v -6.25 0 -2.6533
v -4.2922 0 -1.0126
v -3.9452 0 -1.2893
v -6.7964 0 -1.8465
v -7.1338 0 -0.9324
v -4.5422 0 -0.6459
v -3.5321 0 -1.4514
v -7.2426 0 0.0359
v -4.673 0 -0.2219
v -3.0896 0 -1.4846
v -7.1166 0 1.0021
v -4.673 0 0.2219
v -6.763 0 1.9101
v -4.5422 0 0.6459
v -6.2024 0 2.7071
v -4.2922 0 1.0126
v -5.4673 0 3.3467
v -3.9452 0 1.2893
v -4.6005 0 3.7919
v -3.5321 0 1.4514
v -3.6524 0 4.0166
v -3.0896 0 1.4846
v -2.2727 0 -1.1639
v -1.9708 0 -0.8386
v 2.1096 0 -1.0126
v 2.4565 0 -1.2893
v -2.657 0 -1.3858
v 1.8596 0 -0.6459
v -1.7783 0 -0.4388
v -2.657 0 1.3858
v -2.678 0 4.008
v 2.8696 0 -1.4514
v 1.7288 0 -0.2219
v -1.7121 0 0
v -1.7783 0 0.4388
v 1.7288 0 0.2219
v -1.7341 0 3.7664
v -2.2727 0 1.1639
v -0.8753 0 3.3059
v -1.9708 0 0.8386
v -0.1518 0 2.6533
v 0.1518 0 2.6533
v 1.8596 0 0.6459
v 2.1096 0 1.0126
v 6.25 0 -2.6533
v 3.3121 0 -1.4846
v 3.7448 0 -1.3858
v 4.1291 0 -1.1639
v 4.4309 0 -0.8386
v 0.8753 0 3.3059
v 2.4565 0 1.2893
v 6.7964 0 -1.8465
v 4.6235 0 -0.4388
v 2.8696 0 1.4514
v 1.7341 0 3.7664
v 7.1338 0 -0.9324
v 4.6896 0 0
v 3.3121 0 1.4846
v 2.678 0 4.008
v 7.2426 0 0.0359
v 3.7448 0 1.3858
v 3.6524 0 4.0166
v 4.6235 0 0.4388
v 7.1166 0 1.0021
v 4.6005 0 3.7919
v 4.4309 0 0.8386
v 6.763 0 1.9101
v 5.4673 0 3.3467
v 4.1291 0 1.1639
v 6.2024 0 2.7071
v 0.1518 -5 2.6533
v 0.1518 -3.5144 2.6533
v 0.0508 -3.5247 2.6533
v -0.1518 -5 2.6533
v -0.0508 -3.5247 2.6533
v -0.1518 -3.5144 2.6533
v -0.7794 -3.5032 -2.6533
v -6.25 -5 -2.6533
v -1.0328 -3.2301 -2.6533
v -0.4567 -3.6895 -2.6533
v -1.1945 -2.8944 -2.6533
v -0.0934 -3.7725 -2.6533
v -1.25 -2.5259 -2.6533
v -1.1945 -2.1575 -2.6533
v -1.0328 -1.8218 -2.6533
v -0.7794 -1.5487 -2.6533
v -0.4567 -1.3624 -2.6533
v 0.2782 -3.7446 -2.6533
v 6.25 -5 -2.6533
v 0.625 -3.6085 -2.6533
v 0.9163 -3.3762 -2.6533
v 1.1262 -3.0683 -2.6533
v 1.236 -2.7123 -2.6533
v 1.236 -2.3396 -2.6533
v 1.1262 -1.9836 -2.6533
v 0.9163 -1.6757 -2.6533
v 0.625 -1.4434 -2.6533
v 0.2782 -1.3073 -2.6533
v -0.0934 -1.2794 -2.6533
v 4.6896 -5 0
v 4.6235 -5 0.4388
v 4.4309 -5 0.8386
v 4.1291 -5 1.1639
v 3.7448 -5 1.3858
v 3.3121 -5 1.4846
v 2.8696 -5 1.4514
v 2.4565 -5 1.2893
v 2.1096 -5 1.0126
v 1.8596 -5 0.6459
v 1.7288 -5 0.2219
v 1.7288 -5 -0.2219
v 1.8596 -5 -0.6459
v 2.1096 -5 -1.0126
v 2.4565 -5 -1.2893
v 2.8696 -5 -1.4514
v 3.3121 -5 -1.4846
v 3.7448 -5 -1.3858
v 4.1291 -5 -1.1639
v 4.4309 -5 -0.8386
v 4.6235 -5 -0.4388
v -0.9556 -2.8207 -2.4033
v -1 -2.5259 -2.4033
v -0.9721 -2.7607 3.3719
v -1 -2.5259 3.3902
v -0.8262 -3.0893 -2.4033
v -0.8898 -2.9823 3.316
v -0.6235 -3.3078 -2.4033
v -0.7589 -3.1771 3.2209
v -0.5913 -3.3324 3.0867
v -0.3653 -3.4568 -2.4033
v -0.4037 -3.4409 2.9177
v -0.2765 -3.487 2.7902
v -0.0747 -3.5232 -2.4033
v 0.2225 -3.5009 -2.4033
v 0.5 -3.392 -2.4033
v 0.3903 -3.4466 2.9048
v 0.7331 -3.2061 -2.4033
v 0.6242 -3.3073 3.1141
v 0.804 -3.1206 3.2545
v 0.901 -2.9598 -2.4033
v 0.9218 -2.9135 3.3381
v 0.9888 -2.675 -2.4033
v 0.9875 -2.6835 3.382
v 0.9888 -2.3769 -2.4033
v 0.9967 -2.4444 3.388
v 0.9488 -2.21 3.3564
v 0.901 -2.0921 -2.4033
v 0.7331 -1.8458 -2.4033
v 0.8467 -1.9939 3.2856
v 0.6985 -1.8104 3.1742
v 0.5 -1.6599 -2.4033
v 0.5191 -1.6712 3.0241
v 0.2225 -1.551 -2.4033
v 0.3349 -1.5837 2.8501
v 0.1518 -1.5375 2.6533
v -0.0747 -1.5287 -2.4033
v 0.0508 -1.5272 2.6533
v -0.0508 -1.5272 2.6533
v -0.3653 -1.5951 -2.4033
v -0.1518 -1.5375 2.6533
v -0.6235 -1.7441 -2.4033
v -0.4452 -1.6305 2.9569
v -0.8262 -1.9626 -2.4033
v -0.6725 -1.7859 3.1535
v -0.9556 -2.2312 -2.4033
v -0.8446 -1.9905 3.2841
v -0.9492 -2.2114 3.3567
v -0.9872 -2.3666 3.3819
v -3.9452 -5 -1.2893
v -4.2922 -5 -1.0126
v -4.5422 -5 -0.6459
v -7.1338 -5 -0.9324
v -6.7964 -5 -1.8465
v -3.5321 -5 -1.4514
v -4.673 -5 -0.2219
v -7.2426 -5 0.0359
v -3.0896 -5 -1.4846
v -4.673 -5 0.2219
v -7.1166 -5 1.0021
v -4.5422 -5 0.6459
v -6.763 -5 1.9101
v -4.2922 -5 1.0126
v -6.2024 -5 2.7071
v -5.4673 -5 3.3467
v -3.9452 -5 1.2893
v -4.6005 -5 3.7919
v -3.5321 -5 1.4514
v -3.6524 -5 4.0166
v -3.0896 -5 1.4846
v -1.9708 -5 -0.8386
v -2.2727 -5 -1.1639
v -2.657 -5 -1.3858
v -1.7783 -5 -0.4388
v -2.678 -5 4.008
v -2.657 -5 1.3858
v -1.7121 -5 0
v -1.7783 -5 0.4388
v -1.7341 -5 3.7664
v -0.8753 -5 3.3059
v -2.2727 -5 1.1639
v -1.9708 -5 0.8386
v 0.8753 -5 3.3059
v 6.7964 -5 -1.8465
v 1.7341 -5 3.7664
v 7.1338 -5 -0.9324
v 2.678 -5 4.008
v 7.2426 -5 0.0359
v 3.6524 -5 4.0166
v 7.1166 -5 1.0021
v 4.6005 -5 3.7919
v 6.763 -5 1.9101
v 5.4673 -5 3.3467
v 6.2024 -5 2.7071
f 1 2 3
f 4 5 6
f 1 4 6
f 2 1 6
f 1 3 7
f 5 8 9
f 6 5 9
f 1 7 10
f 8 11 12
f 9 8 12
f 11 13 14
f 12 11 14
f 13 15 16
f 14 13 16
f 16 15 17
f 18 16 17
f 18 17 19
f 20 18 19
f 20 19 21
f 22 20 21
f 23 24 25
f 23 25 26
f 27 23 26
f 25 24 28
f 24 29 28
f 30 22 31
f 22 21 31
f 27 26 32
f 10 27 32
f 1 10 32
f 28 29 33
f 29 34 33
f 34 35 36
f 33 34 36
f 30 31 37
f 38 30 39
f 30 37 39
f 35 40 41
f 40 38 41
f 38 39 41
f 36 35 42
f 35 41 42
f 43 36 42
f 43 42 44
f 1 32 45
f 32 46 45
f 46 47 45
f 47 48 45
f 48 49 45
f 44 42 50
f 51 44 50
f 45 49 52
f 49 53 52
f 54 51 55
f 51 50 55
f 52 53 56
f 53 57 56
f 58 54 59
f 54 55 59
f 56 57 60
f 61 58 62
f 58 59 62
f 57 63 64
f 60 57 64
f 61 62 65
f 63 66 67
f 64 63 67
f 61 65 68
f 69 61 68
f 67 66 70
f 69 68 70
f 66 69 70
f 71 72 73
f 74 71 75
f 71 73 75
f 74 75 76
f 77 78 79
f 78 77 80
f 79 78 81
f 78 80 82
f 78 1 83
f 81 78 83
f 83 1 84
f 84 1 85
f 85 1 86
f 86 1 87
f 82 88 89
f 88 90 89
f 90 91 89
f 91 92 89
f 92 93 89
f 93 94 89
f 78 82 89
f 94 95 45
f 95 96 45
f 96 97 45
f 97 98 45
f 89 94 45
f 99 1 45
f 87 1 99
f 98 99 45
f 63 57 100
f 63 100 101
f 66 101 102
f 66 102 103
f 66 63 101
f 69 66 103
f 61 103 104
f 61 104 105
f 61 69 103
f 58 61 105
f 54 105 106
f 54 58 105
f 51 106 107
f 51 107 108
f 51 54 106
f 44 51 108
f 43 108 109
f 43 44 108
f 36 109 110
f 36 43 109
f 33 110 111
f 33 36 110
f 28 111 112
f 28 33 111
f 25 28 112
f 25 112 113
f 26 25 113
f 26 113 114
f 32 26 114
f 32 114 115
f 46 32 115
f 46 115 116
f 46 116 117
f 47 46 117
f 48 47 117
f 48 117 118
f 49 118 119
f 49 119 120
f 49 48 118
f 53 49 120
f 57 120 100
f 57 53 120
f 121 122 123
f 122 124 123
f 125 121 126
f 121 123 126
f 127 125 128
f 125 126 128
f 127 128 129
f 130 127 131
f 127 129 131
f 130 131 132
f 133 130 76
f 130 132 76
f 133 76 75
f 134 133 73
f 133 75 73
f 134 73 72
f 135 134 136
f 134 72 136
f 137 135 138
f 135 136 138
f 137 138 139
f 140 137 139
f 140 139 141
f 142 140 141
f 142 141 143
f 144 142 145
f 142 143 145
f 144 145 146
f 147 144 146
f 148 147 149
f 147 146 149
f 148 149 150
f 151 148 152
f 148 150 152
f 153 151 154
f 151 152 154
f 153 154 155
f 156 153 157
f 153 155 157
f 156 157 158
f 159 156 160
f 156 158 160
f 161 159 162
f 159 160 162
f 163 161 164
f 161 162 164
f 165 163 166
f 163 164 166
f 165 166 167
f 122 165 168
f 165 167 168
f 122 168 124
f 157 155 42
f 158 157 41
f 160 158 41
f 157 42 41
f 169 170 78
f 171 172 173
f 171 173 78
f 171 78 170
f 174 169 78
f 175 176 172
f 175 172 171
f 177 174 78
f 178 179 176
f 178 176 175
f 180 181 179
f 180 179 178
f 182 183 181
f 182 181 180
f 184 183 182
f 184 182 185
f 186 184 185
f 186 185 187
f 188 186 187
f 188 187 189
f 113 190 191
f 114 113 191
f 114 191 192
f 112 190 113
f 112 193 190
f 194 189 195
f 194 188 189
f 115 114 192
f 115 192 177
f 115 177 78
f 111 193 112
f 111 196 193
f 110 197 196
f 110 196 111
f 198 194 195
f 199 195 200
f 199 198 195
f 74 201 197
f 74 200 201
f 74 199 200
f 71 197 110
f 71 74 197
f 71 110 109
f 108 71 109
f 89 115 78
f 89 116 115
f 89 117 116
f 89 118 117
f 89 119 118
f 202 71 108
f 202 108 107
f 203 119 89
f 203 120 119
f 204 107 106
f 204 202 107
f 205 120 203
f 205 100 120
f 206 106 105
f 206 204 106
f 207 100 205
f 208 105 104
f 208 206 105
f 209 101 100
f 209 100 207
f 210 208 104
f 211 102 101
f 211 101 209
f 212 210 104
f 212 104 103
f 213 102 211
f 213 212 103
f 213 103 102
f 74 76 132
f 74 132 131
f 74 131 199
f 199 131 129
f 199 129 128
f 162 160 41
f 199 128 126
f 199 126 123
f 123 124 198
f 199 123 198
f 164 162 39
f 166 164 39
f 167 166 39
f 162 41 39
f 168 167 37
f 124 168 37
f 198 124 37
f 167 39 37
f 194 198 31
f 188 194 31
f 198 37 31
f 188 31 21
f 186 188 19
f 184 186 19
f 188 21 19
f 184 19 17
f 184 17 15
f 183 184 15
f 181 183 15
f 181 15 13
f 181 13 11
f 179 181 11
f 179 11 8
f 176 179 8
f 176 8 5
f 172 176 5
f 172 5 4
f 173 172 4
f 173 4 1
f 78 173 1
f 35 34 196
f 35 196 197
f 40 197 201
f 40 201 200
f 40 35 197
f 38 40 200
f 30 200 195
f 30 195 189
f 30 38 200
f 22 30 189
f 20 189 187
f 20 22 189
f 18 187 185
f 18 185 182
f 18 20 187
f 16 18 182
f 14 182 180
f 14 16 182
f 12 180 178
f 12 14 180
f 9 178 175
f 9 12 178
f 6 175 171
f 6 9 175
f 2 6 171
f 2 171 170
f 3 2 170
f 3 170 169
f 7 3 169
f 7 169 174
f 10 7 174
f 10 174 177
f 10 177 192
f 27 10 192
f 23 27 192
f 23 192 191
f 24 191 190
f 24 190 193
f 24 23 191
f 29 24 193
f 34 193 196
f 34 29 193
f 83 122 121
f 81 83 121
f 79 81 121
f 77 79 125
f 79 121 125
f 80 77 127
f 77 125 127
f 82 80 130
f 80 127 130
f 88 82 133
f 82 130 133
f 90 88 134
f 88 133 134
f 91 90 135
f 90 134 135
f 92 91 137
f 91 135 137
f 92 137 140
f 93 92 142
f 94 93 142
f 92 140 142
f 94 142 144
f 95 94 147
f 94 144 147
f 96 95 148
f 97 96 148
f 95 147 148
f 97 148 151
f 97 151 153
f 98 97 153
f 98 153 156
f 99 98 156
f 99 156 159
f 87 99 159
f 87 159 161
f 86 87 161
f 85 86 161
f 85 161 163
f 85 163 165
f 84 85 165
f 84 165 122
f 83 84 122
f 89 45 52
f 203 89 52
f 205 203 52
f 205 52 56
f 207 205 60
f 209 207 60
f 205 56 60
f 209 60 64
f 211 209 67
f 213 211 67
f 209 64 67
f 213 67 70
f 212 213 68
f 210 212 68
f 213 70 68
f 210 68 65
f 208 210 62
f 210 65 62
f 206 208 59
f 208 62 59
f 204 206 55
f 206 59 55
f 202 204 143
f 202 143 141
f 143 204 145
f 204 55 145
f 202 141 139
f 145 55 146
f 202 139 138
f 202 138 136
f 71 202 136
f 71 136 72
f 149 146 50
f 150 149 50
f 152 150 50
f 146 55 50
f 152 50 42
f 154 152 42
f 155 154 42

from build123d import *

# Parameters (mm, degrees)
F0_R           = 1.488728542
F1_DEPTH       = 5
F5_D           = 2
F5_CSINK_D     = 2.5
F5_CSINK_ANGLE = 90


# Not quite as in the source:
# - a feature of the source that left no trace in its solid (it failed there, or was rolled back) is left out


with BuildPart() as f1:
    # F0 (on Front) → F1 (new body)
    with BuildSketch(Plane.XZ):
        with BuildLine():
            Line((-6.25, -2.6532969418), (6.25, -2.6532969418))
            ThreePointArc((6.25, -2.6532969418), (5.854172537, 3.0491244048), (0.1517511904, 2.6532969418))
            Line((0.1517511904, 2.6532969418), (-0.1517511904, 2.6532969418))
            ThreePointArc((-0.1517511904, 2.6532969418), (-5.854172537, 3.0491244048), (-6.25, -2.6532969418))
        make_face()
        with Locations((-3.2008755952, 0)):
            Circle(F0_R, mode=Mode.SUBTRACT)
        with Locations((3.2008755952, 0)):
            Circle(F0_R, mode=Mode.SUBTRACT)
    extrude(amount=F1_DEPTH)

    # F5 (through all)
    with Locations(Plane(origin=(0, 0, -2.6532969418), x_dir=(1, 0, 0), z_dir=(0, 0, -1))):
        with Locations((0, 2.525947988)):
            CounterSinkHole(F5_D / 2, F5_CSINK_D / 2, counter_sink_angle=F5_CSINK_ANGLE)


solid = f1.part
